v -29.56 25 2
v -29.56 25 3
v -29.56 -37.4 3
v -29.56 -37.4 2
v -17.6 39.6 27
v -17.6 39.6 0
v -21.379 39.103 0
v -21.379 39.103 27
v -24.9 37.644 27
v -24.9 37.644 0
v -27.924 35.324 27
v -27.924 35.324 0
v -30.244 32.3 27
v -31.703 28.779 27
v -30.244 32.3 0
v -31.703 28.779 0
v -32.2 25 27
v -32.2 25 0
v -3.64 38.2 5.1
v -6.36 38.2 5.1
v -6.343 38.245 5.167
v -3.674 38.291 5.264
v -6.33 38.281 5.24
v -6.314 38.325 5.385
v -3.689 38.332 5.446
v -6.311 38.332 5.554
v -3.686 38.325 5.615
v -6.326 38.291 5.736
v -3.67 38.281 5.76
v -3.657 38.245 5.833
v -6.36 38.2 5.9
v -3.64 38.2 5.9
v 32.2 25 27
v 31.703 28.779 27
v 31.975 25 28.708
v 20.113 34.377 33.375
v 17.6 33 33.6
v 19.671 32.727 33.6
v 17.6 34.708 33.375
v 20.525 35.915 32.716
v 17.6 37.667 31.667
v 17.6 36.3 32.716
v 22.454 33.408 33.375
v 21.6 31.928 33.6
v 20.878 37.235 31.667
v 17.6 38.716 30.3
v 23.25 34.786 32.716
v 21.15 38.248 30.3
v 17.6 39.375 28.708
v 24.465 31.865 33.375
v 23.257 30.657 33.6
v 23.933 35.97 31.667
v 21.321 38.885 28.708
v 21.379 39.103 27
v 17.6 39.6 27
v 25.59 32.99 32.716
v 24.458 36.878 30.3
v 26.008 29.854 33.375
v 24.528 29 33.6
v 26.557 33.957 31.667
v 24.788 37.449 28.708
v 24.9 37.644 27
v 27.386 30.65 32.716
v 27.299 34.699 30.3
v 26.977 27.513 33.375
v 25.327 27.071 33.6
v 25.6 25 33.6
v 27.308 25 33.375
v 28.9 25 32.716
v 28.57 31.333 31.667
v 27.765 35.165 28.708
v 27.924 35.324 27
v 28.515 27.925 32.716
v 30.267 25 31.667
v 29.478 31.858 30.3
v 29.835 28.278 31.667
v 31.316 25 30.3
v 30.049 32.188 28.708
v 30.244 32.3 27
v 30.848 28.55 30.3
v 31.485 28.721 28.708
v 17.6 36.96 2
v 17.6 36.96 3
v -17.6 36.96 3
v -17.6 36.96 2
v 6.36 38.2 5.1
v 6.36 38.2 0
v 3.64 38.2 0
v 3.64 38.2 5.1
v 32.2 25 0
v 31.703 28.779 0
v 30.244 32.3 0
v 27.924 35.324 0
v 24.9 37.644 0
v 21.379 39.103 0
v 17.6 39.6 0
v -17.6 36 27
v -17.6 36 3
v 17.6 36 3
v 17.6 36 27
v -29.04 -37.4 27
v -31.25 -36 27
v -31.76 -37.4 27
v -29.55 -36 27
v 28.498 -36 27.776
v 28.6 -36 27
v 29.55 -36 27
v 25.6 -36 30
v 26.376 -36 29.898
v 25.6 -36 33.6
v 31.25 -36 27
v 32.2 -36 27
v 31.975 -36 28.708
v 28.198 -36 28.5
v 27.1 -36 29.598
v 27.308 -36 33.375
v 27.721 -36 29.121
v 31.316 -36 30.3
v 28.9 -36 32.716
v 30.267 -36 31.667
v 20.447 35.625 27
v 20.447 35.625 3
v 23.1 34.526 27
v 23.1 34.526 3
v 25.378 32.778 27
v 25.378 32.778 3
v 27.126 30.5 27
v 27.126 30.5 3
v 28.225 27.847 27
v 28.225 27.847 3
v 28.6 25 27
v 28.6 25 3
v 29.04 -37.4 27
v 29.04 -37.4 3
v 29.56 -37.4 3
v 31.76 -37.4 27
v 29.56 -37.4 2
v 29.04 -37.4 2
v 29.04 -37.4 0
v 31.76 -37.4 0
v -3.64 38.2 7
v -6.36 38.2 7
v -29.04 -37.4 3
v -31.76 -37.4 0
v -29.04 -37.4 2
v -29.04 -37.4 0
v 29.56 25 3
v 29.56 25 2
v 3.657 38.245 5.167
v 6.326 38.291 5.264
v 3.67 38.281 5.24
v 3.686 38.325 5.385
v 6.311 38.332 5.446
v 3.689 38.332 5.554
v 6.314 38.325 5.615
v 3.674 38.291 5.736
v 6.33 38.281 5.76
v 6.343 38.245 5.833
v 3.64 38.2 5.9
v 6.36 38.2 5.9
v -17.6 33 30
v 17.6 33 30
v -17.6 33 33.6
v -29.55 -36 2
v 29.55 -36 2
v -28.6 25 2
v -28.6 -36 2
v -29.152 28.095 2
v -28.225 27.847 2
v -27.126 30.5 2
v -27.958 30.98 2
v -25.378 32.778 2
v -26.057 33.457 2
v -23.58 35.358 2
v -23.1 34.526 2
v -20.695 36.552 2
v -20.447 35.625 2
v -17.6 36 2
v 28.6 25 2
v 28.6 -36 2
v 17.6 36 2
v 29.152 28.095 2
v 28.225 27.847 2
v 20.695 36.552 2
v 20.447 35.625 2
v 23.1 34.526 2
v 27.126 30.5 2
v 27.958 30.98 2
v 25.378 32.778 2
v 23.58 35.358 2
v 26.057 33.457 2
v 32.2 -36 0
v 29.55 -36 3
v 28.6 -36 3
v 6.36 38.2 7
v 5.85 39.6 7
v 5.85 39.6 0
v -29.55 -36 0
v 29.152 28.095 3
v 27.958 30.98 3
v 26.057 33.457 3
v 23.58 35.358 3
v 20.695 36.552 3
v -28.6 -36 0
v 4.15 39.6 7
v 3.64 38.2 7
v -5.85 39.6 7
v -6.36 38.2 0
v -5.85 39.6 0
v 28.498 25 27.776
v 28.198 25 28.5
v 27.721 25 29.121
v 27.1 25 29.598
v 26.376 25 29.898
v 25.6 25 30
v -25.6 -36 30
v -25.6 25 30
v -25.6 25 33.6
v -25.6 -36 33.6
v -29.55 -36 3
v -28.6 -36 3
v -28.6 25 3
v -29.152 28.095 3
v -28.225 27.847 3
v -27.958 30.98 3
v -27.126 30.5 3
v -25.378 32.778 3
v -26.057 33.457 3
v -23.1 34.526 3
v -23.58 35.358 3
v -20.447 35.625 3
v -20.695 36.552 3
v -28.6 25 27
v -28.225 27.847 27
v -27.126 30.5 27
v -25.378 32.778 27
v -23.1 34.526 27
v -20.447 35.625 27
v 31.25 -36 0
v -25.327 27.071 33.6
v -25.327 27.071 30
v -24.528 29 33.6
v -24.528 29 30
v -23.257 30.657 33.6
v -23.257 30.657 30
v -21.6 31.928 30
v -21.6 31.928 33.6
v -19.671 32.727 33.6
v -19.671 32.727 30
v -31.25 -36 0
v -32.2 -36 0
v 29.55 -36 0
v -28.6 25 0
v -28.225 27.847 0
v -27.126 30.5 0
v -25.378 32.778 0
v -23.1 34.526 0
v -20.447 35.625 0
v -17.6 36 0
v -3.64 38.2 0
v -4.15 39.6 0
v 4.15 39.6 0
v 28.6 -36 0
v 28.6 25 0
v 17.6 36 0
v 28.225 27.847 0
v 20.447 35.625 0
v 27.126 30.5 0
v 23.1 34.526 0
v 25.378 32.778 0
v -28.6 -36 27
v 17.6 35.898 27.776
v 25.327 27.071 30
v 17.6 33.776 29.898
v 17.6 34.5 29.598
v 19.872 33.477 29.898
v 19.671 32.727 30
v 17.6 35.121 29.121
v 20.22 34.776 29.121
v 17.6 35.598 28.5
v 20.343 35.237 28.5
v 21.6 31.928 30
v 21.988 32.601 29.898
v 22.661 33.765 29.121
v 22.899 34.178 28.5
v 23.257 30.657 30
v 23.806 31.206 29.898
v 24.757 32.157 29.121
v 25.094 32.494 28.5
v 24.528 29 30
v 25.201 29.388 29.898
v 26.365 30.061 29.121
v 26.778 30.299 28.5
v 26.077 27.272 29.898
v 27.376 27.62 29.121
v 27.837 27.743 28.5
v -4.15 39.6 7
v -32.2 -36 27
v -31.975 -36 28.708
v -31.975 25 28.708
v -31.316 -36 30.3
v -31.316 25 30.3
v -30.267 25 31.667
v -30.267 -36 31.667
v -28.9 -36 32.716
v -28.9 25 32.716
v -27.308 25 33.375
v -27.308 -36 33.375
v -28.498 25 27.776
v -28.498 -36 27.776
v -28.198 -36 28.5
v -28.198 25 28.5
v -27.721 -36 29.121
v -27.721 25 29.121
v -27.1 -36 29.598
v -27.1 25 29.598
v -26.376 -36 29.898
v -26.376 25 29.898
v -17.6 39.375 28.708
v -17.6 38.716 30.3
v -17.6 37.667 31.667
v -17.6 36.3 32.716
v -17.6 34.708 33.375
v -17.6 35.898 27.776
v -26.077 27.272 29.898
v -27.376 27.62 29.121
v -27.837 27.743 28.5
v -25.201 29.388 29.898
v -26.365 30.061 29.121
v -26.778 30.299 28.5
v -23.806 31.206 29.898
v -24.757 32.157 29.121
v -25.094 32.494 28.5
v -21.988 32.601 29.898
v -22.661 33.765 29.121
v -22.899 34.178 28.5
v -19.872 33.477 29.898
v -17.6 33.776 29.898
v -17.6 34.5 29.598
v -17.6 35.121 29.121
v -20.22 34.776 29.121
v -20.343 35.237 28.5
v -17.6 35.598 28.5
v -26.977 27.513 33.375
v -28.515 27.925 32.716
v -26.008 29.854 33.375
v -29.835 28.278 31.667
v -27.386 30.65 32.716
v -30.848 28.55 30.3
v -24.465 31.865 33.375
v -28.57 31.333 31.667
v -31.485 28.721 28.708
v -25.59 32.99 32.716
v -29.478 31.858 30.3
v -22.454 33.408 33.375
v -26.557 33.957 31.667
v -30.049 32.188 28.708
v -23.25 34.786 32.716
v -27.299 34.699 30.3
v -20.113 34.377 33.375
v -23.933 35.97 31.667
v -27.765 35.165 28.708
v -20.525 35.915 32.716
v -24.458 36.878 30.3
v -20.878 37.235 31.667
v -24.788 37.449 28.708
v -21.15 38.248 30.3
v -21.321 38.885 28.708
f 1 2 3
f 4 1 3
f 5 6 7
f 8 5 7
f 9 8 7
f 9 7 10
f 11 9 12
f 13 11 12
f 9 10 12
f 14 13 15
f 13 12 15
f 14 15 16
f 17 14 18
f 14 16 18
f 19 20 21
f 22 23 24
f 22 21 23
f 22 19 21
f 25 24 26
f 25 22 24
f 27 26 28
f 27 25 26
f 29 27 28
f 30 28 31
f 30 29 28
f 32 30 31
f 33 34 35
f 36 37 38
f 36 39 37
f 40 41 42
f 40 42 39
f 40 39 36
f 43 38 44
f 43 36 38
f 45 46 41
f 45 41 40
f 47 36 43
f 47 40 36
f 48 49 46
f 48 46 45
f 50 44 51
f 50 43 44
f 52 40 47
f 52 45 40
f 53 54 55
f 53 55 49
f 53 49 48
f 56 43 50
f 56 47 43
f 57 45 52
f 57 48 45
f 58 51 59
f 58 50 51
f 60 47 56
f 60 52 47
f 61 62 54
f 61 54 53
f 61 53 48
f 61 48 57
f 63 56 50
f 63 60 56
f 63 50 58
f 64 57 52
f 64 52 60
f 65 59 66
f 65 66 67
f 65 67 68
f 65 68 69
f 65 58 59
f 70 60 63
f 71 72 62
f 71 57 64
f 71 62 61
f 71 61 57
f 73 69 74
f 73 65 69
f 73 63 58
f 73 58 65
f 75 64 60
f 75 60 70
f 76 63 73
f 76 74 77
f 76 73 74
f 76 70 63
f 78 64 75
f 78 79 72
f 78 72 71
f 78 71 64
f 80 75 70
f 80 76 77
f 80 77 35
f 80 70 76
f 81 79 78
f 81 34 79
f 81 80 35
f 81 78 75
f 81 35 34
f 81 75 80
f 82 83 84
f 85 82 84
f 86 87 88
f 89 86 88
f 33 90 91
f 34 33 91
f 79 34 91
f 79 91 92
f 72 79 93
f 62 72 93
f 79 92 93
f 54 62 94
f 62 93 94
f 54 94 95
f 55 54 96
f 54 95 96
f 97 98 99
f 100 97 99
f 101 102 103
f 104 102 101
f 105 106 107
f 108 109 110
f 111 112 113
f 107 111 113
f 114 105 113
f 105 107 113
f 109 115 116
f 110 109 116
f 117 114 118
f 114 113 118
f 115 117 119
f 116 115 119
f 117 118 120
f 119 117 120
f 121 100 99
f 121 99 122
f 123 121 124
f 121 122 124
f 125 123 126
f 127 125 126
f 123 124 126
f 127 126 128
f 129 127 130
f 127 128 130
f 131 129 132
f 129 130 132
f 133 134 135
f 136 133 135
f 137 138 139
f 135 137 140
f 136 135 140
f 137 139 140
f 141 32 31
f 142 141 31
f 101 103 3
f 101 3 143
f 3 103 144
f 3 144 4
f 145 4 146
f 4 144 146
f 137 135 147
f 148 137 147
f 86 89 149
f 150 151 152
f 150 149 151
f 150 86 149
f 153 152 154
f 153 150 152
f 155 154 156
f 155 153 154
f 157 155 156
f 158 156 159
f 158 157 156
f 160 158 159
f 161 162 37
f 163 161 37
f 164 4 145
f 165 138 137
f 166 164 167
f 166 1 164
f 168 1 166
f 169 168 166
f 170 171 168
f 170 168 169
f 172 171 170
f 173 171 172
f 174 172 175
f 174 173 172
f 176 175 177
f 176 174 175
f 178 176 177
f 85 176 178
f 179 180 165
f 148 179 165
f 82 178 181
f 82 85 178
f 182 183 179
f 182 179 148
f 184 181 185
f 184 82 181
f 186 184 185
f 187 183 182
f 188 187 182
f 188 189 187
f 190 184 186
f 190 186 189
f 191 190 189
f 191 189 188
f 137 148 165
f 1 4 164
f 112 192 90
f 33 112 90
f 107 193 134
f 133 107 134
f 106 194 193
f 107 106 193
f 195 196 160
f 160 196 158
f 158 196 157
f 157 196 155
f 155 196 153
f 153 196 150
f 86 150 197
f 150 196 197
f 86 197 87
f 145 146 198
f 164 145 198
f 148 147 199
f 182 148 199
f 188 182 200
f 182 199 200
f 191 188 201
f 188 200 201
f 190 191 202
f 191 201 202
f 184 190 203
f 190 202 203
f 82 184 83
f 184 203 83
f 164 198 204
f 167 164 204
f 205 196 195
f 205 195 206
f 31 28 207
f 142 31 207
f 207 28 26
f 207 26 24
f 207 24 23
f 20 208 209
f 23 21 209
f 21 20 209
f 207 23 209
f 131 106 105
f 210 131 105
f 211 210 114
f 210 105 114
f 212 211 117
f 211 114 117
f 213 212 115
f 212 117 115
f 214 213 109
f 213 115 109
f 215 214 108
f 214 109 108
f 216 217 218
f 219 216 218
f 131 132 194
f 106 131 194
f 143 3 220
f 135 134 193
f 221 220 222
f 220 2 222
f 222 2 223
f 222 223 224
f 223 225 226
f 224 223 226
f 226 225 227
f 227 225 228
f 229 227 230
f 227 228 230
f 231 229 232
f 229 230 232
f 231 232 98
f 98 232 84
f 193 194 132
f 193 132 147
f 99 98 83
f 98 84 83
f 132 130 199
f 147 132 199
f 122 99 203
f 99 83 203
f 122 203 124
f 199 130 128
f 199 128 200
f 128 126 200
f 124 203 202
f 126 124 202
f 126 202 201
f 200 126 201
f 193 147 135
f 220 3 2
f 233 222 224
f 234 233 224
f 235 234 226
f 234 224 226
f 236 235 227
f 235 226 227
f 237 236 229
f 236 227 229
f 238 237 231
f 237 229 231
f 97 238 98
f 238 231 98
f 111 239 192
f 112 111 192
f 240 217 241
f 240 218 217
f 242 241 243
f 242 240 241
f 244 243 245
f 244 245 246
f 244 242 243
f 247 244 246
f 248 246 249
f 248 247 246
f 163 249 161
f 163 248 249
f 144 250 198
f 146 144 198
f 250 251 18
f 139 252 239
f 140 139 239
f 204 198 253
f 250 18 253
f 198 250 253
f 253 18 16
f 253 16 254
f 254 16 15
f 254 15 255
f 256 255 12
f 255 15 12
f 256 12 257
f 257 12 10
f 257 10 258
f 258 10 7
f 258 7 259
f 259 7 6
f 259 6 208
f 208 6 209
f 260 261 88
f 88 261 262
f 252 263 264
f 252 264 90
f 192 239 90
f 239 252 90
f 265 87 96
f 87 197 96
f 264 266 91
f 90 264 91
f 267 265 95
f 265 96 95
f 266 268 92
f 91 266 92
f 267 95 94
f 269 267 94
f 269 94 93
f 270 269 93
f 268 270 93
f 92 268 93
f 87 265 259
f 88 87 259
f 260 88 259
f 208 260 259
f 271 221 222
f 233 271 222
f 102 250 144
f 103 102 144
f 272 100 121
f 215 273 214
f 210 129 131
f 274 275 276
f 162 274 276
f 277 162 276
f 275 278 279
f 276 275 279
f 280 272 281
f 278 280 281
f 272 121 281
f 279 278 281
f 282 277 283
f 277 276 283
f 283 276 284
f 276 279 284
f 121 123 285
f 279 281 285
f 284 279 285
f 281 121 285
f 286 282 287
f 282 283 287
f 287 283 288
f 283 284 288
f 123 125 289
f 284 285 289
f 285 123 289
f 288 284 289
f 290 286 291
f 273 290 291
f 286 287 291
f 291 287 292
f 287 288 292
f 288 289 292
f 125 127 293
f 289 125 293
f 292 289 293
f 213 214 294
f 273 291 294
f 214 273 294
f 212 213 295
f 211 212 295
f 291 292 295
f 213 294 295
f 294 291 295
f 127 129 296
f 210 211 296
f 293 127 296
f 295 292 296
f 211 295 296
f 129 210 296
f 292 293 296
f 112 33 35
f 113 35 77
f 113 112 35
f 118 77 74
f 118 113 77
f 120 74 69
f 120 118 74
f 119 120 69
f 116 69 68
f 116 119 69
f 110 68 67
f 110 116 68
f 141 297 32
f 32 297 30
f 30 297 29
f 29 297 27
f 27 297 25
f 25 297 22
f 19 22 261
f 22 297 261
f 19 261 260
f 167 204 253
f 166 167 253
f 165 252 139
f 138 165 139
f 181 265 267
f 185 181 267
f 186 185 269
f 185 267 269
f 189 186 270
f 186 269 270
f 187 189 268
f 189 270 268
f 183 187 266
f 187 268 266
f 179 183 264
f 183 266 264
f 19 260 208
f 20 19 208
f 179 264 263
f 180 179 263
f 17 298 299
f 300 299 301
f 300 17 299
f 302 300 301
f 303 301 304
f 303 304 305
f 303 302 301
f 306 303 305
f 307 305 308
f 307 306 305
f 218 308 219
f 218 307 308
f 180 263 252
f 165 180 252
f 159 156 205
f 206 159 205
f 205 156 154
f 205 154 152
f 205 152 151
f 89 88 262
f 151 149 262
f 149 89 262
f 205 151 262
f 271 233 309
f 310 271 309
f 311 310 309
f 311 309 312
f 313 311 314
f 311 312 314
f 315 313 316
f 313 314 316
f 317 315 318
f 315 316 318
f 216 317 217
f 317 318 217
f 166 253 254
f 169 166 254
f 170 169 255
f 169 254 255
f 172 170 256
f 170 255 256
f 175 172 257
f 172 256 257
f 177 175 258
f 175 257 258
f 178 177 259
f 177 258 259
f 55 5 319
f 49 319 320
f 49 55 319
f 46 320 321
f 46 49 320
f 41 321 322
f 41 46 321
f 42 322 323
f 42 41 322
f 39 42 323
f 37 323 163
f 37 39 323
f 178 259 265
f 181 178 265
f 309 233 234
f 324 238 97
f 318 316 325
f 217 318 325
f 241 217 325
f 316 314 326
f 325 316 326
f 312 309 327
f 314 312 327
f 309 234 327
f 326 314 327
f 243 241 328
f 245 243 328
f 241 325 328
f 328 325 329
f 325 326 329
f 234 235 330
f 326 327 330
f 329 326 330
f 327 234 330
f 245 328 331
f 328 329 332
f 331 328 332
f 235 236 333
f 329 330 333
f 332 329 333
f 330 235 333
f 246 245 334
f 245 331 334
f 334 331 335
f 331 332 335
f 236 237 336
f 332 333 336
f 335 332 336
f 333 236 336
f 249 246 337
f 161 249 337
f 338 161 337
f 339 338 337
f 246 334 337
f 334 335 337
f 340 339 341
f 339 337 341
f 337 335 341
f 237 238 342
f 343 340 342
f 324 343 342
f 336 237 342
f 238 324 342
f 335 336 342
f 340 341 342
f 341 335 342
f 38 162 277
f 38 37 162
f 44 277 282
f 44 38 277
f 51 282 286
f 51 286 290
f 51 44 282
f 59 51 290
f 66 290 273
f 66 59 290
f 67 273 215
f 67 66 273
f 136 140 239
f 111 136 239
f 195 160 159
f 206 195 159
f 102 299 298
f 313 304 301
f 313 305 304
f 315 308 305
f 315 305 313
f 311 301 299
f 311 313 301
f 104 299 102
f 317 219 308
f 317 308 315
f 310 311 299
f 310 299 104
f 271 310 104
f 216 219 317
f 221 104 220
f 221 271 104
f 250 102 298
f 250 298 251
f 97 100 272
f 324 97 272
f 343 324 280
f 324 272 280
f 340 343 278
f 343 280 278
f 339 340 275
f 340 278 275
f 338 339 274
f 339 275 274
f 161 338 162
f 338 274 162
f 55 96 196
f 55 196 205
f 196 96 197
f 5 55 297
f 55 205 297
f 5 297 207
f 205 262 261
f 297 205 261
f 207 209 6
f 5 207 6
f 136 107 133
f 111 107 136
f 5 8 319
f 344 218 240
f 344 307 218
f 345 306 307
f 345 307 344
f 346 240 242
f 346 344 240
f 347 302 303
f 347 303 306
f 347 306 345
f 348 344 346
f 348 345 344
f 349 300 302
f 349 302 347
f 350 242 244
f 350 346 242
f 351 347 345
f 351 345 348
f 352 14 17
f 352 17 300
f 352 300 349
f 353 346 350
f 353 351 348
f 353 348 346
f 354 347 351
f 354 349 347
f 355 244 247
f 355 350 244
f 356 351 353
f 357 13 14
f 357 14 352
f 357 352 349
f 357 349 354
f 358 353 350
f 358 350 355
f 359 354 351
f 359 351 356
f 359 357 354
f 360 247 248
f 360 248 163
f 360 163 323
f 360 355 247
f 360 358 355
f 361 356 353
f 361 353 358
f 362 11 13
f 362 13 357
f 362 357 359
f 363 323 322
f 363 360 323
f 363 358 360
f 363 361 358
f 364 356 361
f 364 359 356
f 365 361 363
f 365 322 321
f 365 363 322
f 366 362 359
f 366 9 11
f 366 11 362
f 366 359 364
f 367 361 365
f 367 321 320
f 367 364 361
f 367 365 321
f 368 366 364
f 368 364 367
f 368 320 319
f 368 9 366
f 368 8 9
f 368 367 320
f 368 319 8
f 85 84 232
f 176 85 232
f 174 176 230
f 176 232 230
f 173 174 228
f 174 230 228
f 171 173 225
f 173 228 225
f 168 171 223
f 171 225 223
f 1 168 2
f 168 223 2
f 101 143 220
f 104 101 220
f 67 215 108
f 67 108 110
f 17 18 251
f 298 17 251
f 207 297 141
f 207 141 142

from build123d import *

# Parameters (mm, degrees)
EXTRUDE_1_DEPTH     = 27
CUT_EXTRUDE_1_DEPTH = 1
CUT_EXTRUDE_4_DEPTH = 7
EXTRUDE_2_DEPTH     = 6.5


with BuildPart() as part:
    # 草圖1 → 填料-伸長1 (new body)
    with BuildSketch(Plane.XY):
        with BuildLine():
            Line((-32.2, 25), (-32.2, -36))
            Line((-32.2, -36), (-31.25, -36))
            Line((-31.25, -36), (-31.759558328, -37.4))
            Line((-31.759558328, -37.4), (-29.040441672, -37.4))
            Line((-29.040441672, -37.4), (-29.55, -36))
            Line((-29.55, -36), (-28.6, -36))
            Line((-28.6, -36), (-28.6, 25))
            ThreePointArc((-28.6, 25), (-25.378174593, 32.778174593), (-17.6, 36))
            Line((-17.6, 36), (17.6, 36))
            ThreePointArc((17.6, 36), (25.378174593, 32.778174593), (28.6, 25))
            Line((28.6, 25), (28.6, -36))
            Line((28.6, -36), (29.55, -36))
            Line((29.55, -36), (29.040441672, -37.4))
            Line((29.040441672, -37.4), (31.759558328, -37.4))
            Line((31.759558328, -37.4), (31.25, -36))
            Line((31.25, -36), (32.2, -36))
            Line((32.2, -36), (32.2, 25))
            ThreePointArc((32.2, 25), (27.923759005, 35.323759005), (17.6, 39.6))
            Line((17.6, 39.6), (-17.6, 39.6))
            ThreePointArc((-17.6, 39.6), (-27.923759005, 35.323759005), (-32.2, 25))
        make_face()
    extrude(amount=EXTRUDE_1_DEPTH)

    # 草圖4 → 除料-伸長1 (cut)
    with BuildSketch(Plane.XY.offset(3)):
        with BuildLine():
            Line((-28.6, -36), (-28.6, 25))
            ThreePointArc((-28.6, 25), (-25.378174593, 32.778174593), (-17.6, 36))
            Line((-17.6, 36), (17.6, 36))
            ThreePointArc((17.6, 36), (25.378174593, 32.778174593), (28.6, 25))
            Line((28.6, 25), (28.6, -36))
            Line((28.6, -36), (28.6, -37.4))
            Line((28.6, -37.4), (29.56, -37.4))
            Line((29.56, -37.4), (29.56, -36))
            Line((29.56, -36), (29.56, 25))
            ThreePointArc((29.56, 25), (26.056997103, 33.456997103), (17.6, 36.96))
            Line((17.6, 36.96), (-17.6, 36.96))
            ThreePointArc((-17.6, 36.96), (-26.056997103, 33.456997103), (-29.56, 25))
            Line((-29.56, 25), (-29.56, -36))
            Line((-29.56, -36), (-29.56, -37.4))
            Line((-29.56, -37.4), (-28.6, -37.4))
            Line((-28.6, -37.4), (-28.6, -36))
        make_face()
    extrude(amount=-CUT_EXTRUDE_1_DEPTH, mode=Mode.SUBTRACT)

    # 掃出2: sweep along a path in 草圖5
    with BuildLine(Plane.XY.offset(27)) as sweep_2_path:
        Line((-30.4, -36), (-30.4, 25))
        ThreePointArc((-30.4, 25), (-26.650966799, 34.050966799), (-17.6, 37.8))
        Line((-17.6, 37.8), (17.6, 37.8))
        ThreePointArc((17.6, 37.8), (26.650966799, 34.050966799), (30.4, 25))
        Line((30.4, 25), (30.4, -36))
    # 草圖7 → 掃出2 (sweep)
    with BuildSketch(Plane.XZ.offset(36)):
        with BuildLine():
            Line((-28.6, 27), (-32.2, 27))
            ThreePointArc((-32.2, 27), (-30.266904756, 31.666904756), (-25.6, 33.6))
            Line((-25.6, 33.6), (-25.6, 30))
            ThreePointArc((-25.6, 30), (-27.721320344, 29.121320344), (-28.6, 27))
        make_face()
    sweep(path=sweep_2_path.line)

    # 草圖9 → 除料-伸長4 (cut)
    with BuildSketch(Plane(origin=(0, 0, 0), x_dir=(-1, 0, 0), z_dir=(0, 0, -1))):
        Polygon((-5.85, 39.6), (-6.359558328, 38.2), (-3.640441672, 38.2), (-4.15, 39.6), align=None)
        Polygon((5.85, 39.6), (4.15, 39.6), (3.640441672, 38.2), (6.359558328, 38.2), align=None)
    extrude(amount=-CUT_EXTRUDE_4_DEPTH, mode=Mode.SUBTRACT)

    # 草圖10 → 填料-伸長2 (add, symmetric)
    with BuildSketch(Plane(origin=(0, 0, 0), x_dir=(0, 0, -1), z_dir=(1, 0, 0))):
        with BuildLine():
            Line((-5.9, 38.2), (-5.1, 38.2))
            ThreePointArc((-5.1, 38.2), (-5.5, 38.334643123), (-5.9, 38.2))
        make_face()
    extrude(amount=EXTRUDE_2_DEPTH, both=True)


solid = part.part
